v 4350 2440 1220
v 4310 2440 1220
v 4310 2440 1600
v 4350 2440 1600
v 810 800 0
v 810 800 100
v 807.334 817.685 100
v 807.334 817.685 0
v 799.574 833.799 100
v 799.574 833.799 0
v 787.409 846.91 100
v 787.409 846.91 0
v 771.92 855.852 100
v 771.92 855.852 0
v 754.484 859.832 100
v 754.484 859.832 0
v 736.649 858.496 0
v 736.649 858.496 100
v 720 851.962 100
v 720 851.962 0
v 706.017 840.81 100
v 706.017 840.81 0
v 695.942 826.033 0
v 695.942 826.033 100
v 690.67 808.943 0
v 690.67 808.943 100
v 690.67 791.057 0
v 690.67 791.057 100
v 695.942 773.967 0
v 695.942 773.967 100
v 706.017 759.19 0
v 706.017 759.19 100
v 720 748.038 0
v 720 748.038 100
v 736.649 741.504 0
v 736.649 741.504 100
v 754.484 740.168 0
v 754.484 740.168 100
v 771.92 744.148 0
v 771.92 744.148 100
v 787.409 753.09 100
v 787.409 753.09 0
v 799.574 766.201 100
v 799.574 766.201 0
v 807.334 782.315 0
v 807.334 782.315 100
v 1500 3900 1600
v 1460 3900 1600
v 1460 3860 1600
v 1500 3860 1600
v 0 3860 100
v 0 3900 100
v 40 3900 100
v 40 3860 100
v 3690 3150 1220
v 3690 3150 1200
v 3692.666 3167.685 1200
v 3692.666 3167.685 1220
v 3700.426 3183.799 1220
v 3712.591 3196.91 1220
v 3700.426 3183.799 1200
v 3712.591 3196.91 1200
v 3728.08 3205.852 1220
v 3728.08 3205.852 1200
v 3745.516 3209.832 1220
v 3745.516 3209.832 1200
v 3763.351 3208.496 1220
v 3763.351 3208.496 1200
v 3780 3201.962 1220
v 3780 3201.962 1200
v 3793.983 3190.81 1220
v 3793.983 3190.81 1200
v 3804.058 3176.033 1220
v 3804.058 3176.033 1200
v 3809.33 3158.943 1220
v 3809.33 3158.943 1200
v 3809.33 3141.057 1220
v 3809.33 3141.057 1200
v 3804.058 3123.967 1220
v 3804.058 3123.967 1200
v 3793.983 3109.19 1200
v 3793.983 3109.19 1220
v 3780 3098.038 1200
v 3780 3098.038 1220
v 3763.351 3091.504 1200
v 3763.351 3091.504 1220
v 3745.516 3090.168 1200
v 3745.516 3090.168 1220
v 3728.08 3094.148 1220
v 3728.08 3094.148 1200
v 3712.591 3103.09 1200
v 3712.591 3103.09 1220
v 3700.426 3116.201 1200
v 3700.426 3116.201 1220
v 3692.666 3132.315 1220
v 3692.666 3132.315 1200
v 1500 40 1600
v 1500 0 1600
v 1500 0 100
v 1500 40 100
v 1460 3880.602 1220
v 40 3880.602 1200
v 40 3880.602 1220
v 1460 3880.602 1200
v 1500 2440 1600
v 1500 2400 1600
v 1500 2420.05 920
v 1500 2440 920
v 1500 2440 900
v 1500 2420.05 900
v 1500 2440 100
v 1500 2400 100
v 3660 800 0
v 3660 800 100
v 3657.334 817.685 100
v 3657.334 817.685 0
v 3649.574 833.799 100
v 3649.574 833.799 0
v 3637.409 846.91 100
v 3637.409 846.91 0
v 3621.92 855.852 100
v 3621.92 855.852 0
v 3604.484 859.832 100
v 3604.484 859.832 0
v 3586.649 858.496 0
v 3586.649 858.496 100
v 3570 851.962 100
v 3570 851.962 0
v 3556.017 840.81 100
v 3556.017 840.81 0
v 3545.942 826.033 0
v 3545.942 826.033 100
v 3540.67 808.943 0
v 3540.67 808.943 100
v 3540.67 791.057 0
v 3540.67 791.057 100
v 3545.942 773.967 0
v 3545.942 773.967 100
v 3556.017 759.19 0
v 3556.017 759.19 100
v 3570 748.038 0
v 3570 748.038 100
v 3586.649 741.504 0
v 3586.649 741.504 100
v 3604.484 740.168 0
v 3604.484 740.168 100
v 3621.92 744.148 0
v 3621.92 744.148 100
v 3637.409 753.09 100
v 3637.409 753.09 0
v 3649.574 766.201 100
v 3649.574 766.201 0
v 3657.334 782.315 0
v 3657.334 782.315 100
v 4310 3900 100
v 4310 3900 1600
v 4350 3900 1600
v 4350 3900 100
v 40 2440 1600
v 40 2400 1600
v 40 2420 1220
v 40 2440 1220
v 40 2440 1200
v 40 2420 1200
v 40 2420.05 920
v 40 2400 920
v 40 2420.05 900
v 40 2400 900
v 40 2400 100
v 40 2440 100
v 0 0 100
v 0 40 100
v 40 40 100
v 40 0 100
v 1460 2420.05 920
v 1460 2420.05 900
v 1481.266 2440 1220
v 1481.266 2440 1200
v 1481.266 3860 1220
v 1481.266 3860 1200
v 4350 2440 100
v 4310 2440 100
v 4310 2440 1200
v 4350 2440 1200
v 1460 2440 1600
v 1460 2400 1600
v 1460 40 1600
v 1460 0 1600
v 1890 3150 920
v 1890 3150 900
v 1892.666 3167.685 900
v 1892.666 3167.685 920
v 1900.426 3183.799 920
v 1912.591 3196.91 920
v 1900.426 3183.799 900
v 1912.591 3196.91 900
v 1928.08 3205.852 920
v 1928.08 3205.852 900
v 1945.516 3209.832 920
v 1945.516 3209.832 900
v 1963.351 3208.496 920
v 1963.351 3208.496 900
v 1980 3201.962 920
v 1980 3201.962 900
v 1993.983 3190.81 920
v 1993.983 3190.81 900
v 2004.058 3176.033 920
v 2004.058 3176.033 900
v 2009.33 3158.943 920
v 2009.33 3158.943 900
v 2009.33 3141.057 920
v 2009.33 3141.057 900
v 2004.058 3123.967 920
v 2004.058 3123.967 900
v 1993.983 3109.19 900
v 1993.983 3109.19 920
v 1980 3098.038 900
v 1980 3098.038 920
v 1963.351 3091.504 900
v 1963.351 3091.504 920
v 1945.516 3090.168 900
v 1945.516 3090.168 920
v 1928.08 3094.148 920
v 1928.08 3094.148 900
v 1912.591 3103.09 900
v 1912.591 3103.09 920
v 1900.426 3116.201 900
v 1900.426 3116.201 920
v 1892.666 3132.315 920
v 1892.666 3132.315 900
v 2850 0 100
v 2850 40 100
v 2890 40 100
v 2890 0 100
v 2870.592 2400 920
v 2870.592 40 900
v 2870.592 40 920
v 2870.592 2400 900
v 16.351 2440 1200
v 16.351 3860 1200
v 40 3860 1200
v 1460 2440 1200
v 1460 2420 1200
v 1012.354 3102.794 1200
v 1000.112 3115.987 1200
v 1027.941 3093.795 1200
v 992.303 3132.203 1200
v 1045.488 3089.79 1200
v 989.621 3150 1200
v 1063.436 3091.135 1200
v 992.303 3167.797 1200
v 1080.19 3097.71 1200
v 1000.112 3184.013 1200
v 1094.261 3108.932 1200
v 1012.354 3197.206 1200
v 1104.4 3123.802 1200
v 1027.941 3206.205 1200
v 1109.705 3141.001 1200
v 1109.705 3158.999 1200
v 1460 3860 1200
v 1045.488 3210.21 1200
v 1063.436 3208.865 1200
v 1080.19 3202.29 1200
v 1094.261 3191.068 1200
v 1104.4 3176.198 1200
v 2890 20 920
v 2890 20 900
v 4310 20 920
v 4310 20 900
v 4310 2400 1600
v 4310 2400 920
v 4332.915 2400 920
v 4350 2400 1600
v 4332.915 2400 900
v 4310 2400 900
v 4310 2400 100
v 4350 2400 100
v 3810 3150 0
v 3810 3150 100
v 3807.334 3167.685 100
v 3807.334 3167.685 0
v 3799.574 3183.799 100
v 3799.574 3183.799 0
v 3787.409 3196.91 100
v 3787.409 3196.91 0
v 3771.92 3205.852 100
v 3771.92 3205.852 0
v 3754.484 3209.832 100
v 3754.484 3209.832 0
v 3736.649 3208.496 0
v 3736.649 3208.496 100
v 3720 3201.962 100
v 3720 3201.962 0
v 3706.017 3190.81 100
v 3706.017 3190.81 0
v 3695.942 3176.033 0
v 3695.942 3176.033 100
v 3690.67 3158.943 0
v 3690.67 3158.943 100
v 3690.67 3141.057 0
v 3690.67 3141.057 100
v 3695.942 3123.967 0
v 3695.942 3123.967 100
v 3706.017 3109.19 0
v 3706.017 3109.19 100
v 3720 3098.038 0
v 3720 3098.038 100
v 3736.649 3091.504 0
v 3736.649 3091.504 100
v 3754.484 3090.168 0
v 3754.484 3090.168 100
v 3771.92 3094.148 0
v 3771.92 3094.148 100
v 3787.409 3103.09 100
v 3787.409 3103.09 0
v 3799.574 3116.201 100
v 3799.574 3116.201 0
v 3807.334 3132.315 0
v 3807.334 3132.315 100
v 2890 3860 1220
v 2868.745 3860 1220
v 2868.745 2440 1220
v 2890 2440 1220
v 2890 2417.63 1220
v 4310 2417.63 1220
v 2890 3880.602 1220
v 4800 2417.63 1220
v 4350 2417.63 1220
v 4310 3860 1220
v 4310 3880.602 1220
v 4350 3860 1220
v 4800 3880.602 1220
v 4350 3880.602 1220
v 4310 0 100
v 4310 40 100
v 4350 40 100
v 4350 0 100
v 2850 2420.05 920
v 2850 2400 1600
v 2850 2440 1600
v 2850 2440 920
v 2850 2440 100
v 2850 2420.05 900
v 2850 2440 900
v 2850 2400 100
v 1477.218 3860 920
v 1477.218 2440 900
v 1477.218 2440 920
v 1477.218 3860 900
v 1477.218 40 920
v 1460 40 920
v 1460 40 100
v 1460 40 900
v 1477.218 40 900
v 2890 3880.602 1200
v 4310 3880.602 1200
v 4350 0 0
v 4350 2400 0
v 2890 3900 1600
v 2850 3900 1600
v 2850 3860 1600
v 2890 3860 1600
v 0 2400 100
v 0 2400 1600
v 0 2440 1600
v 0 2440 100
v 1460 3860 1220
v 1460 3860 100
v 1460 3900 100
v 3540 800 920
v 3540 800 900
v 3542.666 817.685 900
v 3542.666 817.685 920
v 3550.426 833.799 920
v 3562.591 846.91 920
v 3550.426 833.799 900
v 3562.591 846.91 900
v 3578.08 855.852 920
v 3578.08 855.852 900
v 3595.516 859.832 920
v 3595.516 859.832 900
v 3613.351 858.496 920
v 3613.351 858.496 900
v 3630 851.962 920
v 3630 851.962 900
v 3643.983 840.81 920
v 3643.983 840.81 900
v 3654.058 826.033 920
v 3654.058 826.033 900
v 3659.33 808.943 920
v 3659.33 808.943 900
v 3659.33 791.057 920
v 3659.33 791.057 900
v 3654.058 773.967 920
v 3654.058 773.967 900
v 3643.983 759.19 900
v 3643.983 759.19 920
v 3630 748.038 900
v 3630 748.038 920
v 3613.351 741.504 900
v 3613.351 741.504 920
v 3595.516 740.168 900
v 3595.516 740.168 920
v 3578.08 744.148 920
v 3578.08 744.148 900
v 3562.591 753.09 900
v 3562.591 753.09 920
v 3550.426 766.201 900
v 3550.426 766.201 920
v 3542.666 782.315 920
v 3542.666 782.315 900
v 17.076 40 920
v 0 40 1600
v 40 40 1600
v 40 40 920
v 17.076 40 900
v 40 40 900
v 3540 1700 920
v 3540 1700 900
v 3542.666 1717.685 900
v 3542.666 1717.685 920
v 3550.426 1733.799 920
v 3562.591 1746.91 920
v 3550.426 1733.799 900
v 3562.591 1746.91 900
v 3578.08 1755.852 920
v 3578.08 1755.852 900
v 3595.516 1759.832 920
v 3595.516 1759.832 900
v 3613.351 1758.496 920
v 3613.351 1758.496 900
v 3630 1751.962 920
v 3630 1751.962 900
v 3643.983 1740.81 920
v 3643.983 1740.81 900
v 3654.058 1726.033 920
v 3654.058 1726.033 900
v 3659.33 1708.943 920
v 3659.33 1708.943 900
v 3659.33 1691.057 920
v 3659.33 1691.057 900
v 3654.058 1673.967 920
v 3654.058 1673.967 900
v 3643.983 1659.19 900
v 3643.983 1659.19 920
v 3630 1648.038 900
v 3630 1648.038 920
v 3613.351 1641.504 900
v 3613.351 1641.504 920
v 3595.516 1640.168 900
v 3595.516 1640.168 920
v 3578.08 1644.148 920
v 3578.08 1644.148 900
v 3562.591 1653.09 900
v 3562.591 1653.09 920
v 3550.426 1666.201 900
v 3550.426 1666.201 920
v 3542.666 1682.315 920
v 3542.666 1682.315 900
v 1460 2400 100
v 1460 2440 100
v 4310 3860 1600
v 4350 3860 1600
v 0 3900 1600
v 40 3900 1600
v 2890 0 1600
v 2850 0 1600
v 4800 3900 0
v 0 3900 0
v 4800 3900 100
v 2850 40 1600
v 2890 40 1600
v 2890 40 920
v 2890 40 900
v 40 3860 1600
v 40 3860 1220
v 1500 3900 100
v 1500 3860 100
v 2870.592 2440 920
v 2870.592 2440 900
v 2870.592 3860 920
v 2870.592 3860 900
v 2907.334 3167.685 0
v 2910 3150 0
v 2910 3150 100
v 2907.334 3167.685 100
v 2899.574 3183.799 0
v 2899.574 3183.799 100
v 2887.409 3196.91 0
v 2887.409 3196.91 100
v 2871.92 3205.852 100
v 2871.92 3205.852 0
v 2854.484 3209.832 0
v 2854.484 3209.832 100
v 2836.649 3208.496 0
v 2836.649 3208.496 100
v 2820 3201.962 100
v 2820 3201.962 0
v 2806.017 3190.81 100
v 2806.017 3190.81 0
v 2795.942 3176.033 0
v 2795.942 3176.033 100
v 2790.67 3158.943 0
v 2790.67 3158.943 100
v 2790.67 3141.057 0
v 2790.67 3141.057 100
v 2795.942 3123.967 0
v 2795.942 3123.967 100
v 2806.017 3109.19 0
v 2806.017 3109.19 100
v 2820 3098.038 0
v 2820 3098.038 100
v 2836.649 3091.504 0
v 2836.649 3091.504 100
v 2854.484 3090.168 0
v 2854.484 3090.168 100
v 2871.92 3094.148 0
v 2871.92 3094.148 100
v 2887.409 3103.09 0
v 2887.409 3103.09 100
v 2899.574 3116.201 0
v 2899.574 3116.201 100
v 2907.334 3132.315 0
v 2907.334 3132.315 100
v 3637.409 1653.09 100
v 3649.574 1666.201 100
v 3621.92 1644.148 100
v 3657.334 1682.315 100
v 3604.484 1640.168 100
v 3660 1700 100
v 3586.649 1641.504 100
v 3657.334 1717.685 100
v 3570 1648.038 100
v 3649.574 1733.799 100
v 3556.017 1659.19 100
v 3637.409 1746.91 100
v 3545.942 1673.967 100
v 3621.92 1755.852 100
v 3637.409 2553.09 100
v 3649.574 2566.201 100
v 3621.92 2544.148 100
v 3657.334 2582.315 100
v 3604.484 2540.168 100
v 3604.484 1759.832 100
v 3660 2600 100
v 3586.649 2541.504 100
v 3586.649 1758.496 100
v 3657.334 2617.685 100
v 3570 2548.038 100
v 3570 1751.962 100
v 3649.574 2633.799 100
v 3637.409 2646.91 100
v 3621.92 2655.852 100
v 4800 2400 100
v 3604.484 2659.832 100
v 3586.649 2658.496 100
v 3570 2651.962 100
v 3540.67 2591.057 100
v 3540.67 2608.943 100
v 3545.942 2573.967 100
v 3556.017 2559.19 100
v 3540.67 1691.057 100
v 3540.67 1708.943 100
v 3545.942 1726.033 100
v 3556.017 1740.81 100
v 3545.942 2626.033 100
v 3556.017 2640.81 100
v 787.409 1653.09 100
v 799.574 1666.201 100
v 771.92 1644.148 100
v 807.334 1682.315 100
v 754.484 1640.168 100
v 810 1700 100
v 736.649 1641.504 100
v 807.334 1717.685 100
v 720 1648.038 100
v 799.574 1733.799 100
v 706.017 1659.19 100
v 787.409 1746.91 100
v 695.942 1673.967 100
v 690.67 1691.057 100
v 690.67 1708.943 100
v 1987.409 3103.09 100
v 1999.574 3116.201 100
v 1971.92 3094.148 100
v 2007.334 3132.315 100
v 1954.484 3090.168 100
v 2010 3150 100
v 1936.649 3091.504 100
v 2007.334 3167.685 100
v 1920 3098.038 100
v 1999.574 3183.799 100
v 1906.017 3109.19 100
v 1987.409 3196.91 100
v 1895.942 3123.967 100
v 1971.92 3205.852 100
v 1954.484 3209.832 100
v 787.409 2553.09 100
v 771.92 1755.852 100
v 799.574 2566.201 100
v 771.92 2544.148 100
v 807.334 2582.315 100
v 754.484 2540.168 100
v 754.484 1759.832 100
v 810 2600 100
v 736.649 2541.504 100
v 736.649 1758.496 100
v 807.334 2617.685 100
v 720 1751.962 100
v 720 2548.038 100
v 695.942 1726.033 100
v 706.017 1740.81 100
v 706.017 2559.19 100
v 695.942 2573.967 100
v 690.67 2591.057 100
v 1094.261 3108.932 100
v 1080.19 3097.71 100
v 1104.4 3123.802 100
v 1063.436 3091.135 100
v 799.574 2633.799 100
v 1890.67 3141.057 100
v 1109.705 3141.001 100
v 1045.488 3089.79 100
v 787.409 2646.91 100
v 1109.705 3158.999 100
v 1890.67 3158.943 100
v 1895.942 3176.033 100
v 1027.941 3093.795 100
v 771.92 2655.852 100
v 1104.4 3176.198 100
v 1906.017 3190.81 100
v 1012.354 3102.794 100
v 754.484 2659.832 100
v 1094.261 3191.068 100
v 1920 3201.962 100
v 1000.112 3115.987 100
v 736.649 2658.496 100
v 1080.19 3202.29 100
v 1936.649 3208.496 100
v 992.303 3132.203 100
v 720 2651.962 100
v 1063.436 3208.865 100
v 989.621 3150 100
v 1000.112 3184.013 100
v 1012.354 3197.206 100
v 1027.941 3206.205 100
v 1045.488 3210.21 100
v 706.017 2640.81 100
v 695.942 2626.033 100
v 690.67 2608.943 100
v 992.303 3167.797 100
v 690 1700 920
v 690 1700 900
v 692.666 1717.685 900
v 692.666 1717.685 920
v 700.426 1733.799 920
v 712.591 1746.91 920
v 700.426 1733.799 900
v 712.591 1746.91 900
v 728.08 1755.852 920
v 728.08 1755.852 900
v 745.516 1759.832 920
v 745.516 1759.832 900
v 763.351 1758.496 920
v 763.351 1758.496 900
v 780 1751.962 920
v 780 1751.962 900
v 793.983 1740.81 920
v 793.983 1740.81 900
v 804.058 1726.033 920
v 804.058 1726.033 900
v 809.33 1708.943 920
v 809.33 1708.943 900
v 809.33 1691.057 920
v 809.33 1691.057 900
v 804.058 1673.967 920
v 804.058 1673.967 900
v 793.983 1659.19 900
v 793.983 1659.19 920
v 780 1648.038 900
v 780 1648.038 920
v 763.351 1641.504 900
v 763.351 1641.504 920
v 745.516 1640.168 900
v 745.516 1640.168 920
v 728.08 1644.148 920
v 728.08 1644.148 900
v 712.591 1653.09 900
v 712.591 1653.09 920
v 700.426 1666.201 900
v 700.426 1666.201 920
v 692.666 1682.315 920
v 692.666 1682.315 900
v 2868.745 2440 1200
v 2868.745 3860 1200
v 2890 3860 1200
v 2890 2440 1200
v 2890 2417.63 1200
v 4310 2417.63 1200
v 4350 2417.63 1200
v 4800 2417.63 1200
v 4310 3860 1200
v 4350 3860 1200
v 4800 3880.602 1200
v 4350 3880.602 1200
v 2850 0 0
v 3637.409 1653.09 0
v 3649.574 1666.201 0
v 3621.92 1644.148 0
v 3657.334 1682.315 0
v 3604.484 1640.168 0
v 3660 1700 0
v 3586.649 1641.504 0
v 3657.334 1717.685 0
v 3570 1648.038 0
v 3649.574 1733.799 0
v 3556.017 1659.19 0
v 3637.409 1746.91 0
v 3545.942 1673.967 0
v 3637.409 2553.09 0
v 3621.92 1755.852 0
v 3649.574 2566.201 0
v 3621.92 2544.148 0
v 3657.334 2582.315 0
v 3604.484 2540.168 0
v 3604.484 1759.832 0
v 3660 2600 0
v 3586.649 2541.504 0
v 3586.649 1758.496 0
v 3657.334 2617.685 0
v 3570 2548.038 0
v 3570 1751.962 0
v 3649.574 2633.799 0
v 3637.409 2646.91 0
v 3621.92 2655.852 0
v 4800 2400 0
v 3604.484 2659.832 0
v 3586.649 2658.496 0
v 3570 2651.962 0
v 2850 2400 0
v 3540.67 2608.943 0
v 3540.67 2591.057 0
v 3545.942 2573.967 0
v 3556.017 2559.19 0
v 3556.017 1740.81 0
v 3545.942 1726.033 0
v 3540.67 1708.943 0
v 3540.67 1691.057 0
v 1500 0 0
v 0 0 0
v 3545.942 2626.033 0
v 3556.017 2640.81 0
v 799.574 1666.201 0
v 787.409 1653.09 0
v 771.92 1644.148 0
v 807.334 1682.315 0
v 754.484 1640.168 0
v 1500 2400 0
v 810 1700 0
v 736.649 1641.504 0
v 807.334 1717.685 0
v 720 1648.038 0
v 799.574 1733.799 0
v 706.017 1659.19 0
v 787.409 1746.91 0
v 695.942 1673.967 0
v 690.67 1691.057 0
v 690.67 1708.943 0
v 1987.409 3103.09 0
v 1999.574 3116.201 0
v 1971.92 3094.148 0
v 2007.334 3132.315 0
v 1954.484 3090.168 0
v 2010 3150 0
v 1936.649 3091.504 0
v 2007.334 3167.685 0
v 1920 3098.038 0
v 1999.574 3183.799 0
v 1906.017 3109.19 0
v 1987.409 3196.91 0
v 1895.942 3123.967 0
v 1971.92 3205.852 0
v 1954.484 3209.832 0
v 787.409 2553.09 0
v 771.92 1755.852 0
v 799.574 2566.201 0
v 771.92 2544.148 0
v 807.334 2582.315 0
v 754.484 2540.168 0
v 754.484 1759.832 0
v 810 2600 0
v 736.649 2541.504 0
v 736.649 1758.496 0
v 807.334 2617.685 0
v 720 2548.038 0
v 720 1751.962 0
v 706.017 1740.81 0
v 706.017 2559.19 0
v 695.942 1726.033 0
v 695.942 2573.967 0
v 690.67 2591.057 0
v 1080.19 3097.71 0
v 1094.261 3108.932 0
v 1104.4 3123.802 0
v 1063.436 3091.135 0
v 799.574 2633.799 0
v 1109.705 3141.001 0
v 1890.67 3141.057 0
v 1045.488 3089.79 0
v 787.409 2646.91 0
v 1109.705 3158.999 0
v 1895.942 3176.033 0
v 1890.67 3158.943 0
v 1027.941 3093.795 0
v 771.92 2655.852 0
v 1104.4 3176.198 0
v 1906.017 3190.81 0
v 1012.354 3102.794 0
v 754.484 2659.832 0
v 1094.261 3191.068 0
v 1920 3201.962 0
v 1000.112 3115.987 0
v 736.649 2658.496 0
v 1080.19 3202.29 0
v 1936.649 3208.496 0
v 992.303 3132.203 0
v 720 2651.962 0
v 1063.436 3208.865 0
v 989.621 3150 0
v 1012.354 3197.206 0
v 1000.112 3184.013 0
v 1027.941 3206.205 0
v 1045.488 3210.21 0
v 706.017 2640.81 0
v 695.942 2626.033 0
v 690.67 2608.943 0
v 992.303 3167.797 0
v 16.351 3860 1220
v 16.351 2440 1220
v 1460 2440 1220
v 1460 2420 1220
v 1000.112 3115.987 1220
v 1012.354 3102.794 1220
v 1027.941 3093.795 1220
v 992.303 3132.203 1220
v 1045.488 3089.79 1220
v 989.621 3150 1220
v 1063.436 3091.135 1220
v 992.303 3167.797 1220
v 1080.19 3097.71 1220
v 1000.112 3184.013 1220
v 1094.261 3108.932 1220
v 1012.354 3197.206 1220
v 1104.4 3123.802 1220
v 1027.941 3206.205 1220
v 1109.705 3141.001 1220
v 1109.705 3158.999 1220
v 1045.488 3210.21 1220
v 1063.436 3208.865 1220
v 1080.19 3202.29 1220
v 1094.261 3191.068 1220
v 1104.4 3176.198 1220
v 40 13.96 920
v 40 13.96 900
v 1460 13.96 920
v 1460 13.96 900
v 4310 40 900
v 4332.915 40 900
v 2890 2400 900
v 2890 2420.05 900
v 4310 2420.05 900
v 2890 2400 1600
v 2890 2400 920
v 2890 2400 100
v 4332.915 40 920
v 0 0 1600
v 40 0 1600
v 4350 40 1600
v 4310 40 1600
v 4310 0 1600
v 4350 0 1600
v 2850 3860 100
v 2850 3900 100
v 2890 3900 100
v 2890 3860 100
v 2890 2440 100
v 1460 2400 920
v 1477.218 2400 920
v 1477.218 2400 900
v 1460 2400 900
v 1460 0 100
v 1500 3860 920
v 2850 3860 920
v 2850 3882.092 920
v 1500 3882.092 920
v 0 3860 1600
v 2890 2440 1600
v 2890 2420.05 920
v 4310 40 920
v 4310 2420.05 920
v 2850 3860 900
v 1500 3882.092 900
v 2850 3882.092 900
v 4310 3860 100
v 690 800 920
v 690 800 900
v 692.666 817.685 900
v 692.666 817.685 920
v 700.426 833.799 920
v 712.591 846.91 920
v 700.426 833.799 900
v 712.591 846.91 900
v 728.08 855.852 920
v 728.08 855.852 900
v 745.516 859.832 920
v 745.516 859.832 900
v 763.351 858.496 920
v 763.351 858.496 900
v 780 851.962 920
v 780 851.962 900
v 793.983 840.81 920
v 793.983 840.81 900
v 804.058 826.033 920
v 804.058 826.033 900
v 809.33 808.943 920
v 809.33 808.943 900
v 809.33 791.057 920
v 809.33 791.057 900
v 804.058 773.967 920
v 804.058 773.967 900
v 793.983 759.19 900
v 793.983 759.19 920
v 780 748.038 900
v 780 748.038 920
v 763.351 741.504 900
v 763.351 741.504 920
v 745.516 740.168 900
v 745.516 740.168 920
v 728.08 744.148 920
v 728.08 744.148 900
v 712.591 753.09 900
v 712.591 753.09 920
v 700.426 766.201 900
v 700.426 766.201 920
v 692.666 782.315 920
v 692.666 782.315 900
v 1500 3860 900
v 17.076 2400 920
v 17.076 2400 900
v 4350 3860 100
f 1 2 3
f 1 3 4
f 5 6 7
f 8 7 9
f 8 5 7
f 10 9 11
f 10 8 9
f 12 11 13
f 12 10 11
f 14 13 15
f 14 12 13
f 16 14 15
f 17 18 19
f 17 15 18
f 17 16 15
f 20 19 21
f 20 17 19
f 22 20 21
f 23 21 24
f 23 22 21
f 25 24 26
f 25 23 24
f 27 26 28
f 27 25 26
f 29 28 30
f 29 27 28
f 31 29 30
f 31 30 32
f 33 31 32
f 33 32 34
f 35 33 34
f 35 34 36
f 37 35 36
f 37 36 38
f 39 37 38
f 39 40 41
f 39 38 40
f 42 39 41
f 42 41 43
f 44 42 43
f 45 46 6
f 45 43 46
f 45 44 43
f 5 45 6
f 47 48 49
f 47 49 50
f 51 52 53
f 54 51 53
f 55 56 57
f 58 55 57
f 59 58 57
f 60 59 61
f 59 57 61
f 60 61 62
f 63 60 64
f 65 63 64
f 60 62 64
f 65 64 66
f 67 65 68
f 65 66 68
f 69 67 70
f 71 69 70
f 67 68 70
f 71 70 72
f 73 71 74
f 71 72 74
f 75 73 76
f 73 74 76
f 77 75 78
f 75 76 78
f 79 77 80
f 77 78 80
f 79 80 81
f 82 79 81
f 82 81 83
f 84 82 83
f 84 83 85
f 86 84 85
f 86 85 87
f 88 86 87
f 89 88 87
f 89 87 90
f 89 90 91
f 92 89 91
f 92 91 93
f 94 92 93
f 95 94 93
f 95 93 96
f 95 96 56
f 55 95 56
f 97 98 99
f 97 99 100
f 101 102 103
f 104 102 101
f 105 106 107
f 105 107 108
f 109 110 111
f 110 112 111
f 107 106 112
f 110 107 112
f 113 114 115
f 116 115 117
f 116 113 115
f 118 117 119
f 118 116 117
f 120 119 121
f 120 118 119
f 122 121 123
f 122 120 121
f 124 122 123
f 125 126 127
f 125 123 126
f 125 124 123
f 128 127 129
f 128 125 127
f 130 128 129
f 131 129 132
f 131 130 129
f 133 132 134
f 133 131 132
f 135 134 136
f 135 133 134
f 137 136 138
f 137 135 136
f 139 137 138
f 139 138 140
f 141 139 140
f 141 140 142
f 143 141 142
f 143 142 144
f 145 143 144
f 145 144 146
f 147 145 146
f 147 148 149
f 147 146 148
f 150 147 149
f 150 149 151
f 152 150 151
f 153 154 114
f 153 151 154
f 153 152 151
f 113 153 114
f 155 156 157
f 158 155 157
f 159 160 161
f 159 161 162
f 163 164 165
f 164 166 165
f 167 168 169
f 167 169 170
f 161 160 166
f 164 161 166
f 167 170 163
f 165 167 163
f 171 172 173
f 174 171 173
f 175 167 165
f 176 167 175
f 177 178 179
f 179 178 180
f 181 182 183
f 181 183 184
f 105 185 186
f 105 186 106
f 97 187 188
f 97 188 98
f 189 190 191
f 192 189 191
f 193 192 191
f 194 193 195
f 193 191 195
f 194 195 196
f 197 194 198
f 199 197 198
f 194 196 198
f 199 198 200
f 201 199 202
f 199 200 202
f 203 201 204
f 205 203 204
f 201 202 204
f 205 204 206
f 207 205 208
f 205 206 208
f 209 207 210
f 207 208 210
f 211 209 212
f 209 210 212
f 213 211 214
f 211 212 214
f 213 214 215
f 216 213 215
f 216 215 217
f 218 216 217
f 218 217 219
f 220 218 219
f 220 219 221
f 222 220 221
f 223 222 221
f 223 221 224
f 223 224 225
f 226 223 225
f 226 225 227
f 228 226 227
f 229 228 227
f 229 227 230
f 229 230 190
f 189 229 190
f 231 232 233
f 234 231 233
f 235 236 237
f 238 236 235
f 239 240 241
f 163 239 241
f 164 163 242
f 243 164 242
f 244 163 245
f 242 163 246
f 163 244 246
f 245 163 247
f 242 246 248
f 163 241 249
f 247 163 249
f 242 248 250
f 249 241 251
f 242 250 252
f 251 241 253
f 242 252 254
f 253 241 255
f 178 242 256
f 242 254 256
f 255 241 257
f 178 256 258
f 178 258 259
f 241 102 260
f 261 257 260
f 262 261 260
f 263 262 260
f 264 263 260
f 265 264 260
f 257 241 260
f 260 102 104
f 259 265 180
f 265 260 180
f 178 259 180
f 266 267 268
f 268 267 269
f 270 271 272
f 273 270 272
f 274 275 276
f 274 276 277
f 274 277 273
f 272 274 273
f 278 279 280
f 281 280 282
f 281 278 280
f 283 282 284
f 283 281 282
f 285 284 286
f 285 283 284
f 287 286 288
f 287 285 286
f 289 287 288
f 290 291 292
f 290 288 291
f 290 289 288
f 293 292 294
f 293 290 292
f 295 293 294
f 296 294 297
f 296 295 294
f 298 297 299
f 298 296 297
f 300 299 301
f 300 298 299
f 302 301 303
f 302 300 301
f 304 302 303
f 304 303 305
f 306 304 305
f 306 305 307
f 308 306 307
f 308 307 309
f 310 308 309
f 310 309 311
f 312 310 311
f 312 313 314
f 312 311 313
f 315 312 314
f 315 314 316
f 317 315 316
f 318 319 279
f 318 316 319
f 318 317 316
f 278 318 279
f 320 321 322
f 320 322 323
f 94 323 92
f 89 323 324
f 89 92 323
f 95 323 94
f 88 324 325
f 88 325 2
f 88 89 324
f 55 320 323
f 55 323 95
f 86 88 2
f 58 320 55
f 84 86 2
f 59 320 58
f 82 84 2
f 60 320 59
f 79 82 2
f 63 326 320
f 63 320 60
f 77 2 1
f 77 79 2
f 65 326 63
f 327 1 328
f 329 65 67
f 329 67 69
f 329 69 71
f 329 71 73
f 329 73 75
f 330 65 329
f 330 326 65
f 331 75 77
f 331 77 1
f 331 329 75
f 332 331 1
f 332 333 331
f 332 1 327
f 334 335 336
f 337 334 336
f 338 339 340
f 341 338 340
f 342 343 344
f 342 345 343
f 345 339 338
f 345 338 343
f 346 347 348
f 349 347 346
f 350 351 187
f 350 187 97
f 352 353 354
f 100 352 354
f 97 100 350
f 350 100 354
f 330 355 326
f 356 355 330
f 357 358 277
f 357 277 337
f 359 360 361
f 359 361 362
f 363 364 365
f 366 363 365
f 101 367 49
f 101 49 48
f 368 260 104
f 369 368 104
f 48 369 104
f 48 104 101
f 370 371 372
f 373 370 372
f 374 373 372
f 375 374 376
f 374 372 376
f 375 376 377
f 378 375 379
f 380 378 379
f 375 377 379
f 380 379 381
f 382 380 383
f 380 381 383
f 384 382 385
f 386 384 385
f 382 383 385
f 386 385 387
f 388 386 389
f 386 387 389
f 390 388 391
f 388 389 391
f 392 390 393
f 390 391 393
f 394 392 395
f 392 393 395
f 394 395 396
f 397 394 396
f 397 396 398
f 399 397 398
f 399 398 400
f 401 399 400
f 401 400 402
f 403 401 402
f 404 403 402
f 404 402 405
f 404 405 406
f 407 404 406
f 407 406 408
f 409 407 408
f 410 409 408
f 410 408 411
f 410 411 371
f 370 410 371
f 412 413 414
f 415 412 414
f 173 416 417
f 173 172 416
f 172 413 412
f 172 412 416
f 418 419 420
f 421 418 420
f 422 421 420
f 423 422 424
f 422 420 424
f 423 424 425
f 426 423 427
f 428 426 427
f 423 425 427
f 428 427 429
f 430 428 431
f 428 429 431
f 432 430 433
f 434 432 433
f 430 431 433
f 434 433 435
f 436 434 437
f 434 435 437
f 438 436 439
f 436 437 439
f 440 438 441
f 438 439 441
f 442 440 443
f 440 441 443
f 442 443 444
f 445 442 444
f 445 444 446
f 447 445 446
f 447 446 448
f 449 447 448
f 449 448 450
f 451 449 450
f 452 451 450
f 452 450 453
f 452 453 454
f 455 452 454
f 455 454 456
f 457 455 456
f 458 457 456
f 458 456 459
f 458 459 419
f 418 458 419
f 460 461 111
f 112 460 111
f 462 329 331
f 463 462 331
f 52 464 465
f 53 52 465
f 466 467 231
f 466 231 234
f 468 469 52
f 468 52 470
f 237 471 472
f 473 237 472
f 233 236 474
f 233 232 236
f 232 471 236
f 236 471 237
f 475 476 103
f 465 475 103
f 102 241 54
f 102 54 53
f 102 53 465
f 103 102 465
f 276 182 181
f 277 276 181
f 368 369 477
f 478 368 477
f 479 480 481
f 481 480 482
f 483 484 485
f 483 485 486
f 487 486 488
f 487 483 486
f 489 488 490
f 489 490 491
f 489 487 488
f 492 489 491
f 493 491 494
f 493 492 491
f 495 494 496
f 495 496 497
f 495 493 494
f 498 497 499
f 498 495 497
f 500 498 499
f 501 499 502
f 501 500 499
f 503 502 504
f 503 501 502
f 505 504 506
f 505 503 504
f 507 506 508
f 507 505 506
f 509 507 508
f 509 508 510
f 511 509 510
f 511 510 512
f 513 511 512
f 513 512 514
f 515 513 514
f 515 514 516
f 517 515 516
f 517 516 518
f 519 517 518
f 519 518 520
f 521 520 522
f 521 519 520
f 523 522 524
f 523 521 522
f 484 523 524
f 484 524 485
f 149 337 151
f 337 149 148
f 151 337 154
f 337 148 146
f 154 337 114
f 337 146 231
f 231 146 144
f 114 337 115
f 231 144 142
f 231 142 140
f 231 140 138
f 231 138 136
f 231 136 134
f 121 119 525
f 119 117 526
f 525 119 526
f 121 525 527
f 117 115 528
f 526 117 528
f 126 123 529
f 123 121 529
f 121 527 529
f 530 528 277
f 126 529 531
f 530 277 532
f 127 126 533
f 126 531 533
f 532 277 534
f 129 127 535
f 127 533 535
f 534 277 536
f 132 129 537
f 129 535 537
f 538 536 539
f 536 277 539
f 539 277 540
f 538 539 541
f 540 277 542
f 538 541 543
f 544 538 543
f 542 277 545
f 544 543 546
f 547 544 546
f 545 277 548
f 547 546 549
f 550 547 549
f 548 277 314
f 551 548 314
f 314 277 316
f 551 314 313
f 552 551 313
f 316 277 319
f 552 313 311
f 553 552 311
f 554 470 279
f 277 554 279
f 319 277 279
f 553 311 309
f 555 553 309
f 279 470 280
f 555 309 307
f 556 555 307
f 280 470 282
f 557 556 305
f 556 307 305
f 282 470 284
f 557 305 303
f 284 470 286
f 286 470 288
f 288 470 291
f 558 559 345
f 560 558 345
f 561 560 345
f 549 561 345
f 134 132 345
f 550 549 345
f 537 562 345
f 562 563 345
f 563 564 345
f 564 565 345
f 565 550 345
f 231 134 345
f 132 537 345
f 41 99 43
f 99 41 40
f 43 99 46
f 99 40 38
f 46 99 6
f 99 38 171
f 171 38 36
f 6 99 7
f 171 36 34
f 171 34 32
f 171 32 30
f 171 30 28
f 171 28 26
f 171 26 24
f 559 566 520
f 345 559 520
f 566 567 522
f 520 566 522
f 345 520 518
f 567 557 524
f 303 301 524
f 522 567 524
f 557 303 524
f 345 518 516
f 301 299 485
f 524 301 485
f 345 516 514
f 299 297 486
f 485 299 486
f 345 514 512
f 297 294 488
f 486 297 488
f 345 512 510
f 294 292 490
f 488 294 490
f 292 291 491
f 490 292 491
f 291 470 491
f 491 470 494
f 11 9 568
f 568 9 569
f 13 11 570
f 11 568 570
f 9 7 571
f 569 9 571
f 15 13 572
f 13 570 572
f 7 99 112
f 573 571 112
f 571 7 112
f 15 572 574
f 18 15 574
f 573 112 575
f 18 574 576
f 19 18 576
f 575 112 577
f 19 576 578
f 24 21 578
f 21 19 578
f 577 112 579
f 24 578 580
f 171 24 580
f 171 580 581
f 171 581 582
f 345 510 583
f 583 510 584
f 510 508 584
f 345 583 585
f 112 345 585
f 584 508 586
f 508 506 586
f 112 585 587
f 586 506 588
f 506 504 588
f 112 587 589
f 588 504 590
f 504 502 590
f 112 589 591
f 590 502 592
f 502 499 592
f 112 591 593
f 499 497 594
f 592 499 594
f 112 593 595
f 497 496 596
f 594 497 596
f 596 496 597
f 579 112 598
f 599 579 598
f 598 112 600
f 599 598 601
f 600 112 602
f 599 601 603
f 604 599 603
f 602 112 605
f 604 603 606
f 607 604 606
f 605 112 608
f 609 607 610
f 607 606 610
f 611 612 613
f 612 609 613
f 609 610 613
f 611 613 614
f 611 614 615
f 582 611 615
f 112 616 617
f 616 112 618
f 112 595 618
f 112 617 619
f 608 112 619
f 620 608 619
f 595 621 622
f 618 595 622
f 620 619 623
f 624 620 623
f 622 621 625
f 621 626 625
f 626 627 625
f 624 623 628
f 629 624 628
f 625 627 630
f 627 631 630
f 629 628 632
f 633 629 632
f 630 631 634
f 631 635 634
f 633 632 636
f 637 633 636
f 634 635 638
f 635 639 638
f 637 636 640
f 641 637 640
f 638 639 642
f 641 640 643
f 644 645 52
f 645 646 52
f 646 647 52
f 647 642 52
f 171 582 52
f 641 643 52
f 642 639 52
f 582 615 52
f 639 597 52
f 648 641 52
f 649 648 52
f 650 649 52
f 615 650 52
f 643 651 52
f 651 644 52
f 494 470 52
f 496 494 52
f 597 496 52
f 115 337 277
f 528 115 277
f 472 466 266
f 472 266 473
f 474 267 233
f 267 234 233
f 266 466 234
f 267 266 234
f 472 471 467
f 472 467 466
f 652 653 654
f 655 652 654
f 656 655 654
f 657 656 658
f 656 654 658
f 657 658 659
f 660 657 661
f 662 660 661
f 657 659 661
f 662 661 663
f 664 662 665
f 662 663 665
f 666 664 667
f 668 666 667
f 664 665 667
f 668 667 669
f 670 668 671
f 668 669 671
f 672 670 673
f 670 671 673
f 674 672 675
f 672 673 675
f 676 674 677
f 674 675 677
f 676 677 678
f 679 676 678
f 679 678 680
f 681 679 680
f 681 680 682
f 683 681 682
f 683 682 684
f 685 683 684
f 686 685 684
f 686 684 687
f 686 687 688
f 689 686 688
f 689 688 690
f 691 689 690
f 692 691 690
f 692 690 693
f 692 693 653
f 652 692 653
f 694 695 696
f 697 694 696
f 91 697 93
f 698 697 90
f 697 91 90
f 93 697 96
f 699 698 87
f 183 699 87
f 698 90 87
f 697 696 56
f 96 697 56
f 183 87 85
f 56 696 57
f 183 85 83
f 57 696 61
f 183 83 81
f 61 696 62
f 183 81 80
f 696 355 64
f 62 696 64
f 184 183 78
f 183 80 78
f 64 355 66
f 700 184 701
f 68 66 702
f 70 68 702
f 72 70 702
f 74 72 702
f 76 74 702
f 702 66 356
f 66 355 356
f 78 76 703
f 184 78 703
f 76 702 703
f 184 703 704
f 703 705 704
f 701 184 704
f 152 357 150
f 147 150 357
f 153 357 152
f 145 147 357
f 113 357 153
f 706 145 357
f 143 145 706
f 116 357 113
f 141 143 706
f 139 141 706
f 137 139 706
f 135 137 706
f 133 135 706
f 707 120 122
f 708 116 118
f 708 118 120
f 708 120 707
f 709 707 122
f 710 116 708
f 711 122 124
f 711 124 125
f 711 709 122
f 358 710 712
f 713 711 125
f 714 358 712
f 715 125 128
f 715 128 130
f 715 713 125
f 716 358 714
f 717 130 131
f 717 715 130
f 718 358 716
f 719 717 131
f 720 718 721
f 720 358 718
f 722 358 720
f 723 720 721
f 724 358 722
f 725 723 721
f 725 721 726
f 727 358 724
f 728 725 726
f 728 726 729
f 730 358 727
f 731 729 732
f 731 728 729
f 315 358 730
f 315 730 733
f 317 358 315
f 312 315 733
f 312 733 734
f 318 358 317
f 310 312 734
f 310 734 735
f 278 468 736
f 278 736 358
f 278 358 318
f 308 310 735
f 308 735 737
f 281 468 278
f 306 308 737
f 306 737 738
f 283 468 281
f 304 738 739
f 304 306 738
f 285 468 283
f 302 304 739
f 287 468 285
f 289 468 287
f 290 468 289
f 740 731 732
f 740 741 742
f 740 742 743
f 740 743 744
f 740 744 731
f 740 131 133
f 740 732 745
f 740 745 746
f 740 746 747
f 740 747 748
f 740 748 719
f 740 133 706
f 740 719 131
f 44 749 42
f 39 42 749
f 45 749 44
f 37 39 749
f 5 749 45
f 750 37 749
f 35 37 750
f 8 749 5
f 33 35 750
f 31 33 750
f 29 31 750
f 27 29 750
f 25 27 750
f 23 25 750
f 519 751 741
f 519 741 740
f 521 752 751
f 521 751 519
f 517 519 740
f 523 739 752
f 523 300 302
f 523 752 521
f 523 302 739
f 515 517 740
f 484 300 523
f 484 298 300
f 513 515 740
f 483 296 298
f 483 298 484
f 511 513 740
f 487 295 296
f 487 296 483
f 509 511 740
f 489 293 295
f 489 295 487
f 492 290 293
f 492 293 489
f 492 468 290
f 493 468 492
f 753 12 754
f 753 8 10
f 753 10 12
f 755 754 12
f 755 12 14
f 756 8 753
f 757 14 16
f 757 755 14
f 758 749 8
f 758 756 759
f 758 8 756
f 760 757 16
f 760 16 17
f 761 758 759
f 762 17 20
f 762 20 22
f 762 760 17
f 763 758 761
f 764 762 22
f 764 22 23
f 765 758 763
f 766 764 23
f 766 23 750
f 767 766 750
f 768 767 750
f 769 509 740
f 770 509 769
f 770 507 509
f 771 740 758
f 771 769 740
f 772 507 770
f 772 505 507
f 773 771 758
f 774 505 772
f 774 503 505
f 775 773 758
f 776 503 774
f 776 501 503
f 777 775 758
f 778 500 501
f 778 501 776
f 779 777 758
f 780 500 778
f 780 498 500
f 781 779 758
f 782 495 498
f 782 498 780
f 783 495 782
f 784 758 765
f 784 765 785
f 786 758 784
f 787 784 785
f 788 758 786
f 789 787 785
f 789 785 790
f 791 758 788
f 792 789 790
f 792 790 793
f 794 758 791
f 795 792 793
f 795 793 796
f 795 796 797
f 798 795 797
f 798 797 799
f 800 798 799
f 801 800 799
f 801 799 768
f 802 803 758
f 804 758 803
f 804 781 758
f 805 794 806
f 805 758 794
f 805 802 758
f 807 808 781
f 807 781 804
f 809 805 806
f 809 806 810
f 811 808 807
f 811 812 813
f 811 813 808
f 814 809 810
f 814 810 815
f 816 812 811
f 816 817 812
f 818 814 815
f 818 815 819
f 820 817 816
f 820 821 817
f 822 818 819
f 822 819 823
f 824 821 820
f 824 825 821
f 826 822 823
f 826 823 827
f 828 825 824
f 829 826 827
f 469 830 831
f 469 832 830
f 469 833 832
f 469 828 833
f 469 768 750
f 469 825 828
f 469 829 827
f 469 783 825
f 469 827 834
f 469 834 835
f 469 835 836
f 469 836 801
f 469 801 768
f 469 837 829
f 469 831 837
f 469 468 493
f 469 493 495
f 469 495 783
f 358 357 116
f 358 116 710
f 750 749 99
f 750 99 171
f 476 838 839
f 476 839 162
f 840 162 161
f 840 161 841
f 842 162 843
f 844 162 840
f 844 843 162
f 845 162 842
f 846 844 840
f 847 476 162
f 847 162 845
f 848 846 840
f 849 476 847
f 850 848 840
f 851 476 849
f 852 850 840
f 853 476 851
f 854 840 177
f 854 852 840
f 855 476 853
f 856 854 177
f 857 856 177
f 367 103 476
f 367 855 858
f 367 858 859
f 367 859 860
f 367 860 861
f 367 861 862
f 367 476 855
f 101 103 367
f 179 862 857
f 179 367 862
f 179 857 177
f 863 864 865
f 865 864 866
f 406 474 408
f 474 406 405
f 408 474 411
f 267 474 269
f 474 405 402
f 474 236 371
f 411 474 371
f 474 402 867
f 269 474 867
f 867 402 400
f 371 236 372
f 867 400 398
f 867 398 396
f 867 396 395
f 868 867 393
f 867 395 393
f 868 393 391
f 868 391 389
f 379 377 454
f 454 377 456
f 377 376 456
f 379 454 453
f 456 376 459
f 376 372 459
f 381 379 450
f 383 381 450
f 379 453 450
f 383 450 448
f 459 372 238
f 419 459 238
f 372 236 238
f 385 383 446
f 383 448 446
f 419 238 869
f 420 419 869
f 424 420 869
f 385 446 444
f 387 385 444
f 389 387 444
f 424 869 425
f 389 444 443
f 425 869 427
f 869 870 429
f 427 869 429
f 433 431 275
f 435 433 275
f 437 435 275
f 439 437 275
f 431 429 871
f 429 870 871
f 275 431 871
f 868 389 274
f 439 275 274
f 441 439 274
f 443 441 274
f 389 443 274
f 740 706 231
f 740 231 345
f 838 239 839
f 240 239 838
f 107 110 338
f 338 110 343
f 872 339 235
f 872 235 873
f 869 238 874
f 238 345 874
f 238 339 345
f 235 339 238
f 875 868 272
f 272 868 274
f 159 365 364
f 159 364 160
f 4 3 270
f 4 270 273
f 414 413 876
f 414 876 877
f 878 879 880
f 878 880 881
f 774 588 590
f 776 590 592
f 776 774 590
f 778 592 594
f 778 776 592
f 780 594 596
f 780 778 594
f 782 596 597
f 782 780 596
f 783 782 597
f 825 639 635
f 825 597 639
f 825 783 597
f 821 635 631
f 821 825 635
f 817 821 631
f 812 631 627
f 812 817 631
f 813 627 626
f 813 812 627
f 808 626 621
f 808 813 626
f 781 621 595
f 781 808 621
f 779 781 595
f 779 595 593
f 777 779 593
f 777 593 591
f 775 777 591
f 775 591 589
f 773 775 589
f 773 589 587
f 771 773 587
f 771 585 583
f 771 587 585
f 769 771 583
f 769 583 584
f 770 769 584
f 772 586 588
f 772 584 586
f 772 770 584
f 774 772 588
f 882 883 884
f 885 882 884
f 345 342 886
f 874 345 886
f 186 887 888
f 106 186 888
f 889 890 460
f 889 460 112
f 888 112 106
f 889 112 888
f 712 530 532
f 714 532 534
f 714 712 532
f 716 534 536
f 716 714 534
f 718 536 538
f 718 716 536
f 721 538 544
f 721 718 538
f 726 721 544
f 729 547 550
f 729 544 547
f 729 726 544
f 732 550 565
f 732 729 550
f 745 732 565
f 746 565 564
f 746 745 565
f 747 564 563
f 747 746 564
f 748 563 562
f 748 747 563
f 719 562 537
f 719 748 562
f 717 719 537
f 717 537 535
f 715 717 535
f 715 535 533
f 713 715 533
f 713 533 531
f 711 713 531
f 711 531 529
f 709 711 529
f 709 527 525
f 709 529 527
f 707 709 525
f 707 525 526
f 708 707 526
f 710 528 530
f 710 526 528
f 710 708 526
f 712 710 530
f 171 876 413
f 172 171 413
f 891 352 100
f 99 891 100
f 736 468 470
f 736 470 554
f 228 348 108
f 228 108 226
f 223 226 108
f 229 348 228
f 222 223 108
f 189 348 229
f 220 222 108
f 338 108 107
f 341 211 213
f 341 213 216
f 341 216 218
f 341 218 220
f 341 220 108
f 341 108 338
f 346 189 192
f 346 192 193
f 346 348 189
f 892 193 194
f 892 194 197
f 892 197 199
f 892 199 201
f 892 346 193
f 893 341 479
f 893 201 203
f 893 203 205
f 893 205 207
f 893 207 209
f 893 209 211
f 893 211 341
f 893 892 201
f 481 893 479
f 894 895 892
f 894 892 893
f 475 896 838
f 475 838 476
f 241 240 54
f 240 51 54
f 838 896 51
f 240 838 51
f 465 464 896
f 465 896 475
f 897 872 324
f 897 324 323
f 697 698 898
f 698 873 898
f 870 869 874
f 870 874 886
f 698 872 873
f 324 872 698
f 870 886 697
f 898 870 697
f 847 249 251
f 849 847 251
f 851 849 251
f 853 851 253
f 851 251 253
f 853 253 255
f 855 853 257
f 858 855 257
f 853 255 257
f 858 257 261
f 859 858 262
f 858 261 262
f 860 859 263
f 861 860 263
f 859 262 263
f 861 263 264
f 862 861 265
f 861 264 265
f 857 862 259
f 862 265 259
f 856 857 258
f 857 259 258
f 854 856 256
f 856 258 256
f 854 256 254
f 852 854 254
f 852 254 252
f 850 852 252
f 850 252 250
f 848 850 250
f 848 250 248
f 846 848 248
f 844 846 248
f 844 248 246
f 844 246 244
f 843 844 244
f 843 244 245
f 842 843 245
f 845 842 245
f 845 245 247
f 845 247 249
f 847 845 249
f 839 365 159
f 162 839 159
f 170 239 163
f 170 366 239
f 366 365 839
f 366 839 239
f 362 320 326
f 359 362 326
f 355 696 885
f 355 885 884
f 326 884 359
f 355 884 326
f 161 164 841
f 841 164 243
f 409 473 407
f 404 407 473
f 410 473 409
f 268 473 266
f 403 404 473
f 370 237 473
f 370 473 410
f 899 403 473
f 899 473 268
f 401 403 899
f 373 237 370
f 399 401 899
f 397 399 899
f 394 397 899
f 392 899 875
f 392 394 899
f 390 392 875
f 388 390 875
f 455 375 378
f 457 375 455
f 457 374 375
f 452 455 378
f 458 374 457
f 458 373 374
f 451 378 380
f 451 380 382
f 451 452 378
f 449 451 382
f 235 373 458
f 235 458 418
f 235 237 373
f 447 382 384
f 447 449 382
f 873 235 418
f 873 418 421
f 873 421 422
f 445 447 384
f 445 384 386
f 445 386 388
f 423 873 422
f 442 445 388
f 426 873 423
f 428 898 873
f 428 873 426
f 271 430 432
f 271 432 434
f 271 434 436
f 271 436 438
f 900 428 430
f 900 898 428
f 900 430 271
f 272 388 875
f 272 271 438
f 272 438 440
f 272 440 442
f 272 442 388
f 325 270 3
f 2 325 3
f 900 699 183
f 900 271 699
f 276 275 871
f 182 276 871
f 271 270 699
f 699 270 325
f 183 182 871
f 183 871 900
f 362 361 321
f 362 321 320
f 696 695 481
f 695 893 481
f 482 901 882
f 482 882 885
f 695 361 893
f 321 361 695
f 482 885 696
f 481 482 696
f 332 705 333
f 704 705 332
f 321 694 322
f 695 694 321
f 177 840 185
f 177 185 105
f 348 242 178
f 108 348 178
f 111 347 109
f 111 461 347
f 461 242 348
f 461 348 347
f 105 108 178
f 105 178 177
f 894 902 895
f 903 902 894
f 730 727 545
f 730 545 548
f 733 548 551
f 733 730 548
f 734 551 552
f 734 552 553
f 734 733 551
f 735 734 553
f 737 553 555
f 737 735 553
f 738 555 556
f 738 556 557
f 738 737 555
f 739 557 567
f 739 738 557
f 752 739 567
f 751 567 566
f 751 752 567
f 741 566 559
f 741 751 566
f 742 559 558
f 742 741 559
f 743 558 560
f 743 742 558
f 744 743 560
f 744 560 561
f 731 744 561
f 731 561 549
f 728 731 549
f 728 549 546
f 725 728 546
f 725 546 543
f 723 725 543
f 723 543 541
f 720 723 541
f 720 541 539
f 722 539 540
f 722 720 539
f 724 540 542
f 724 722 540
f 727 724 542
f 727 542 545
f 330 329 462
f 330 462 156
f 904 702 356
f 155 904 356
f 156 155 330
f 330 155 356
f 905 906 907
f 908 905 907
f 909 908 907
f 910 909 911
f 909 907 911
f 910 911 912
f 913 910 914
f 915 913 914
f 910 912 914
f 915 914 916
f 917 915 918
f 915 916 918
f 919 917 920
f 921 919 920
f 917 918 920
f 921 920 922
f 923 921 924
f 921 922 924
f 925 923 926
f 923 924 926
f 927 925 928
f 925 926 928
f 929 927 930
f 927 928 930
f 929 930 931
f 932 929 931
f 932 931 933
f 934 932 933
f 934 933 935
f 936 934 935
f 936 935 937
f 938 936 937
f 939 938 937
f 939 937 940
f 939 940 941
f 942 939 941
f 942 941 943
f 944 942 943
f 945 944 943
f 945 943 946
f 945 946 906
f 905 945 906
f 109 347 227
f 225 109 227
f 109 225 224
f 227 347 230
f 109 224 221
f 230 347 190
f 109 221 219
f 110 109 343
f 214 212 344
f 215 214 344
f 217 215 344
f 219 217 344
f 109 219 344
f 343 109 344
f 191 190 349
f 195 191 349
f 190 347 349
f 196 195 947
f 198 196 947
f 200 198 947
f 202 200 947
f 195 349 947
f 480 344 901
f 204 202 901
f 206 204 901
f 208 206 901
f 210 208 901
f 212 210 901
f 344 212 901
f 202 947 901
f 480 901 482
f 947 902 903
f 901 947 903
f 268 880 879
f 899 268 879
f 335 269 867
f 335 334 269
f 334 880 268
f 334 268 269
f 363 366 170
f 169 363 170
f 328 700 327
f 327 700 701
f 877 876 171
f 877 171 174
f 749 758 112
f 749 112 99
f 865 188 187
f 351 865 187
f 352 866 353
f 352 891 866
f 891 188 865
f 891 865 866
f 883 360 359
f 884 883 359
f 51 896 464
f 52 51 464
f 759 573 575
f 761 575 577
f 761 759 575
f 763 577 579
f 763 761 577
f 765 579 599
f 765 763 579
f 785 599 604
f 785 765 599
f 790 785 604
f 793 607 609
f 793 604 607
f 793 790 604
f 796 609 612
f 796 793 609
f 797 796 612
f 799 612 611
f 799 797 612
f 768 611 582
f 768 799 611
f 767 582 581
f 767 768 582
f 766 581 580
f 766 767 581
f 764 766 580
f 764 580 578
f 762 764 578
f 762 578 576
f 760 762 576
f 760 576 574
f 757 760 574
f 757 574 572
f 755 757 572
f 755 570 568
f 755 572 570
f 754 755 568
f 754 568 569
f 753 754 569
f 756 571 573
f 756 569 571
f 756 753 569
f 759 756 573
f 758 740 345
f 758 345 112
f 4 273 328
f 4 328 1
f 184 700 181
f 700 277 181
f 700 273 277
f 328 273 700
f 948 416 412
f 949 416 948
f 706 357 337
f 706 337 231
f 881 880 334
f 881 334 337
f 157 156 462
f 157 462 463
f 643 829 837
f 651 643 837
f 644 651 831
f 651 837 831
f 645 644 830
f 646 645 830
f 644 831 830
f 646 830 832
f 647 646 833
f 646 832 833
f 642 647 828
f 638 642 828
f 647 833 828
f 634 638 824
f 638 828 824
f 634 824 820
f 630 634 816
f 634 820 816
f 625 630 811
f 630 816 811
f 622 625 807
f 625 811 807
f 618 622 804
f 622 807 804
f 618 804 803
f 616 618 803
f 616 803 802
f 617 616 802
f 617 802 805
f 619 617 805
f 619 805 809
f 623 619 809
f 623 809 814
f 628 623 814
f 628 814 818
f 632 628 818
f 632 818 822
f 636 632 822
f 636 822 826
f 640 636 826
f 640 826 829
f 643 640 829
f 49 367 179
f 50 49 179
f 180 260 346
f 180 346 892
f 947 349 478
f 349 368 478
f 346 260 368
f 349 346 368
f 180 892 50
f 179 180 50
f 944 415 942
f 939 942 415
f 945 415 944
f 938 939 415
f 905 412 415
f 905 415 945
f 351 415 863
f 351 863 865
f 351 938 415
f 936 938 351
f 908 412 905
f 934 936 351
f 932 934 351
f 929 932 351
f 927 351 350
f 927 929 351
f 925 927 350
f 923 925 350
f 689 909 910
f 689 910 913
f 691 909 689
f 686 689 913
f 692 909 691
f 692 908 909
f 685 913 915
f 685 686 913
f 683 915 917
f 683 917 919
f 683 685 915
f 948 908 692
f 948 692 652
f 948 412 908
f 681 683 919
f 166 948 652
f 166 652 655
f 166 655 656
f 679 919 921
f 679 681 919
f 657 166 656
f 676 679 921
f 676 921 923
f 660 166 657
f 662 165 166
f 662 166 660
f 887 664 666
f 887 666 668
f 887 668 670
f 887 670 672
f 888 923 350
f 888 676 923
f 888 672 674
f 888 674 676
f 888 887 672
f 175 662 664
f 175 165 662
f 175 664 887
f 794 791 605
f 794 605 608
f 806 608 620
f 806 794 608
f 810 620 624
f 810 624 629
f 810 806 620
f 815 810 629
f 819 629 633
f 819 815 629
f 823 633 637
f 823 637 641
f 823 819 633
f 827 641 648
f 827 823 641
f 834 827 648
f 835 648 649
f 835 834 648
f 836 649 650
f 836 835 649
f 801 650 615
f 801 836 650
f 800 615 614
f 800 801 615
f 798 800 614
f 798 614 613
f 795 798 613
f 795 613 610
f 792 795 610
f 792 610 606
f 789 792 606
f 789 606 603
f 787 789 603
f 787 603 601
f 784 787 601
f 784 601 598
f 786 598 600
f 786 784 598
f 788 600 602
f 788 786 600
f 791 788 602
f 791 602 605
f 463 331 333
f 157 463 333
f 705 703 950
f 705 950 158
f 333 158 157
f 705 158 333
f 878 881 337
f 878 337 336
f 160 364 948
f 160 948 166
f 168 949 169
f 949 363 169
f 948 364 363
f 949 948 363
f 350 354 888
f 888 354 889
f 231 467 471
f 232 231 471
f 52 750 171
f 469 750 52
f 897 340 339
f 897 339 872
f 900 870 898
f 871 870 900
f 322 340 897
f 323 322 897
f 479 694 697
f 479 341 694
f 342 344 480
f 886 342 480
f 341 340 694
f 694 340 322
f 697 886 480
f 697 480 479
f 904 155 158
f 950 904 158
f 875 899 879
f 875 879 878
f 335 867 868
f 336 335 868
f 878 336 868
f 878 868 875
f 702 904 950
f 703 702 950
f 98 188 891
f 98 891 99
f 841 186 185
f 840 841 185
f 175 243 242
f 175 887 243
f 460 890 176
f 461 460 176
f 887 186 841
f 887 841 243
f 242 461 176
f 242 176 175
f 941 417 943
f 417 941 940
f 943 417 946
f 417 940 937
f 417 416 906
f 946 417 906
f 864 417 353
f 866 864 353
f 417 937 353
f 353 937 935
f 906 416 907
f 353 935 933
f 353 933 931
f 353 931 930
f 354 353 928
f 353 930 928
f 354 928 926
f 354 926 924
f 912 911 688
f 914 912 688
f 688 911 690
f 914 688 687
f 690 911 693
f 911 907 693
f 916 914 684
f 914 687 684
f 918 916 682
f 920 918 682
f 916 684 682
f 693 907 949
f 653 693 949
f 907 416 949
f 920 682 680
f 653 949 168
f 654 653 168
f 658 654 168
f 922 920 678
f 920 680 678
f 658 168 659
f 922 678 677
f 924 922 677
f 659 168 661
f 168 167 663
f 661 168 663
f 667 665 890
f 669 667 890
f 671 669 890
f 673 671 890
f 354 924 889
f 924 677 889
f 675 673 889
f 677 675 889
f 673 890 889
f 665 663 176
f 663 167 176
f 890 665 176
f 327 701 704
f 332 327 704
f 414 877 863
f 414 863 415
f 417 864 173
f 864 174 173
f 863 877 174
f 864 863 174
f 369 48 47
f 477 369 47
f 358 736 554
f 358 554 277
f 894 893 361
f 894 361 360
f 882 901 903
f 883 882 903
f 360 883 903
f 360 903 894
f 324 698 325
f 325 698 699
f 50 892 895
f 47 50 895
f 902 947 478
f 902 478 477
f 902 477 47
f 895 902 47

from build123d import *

# Parameters (mm, degrees)
SKETCH1_R              = 60
BOSS_EXTRUDE1_DEPTH    = 100
SKETCH2_W              = 40
SKETCH2_H              = 40
BOSS_EXTRUDE2_DEPTH    = 1500
BOSS_EXTRUDE2_2_DEPTH  = 1500
BOSS_EXTRUDE2_3_DEPTH  = 1500
BOSS_EXTRUDE2_4_DEPTH  = 1500
BOSS_EXTRUDE2_5_DEPTH  = 1500
BOSS_EXTRUDE2_6_DEPTH  = 1500
BOSS_EXTRUDE2_7_DEPTH  = 1500
BOSS_EXTRUDE2_8_DEPTH  = 1500
BOSS_EXTRUDE2_9_DEPTH  = 1500
BOSS_EXTRUDE2_10_DEPTH = 1500
BOSS_EXTRUDE2_11_DEPTH = 1500
BOSS_EXTRUDE2_12_DEPTH = 1500
SKETCH5_W              = 1464.914680954
SKETCH5_H              = 1460.602204205
SKETCH5_W_2            = 1931.254962966
SKETCH5_H_2            = 1462.971886732
BOSS_EXTRUDE5_DEPTH    = 20
SKETCH3_W              = 1460.142152684
SKETCH3_H              = 2406.089345402
SKETCH3_W_2            = 1393.373517389
SKETCH3_H_2            = 1462.042486102
SKETCH3_W_3            = 1462.322698413
SKETCH3_H_3            = 2400.049528254
BOSS_EXTRUDE6_DEPTH    = 20
SKETCH6_R              = 60
SKETCH6_R_2            = 60.379118357
CUT_EXTRUDE2_DEPTH     = 1601


with BuildPart() as part:
    # Sketch1 → Boss-Extrude1 (new body)
    with BuildSketch(Plane.XY):
        Polygon((0, 0), (0, 3900), (4800, 3900), (4800, 2400), (4350, 2400), (4350, 0), (2850, 0), (2850, 2400), (1500, 2400), (1500, 0), align=None)
        with Locations((1050, 3150)):
            Circle(SKETCH1_R, mode=Mode.SUBTRACT)
        with Locations((1950, 3150)):
            Circle(SKETCH1_R, mode=Mode.SUBTRACT)
        with Locations((2850, 3150)):
            Circle(SKETCH1_R, mode=Mode.SUBTRACT)
        with Locations((750, 800)):
            Circle(SKETCH1_R, mode=Mode.SUBTRACT)
        with Locations((3600, 800)):
            Circle(SKETCH1_R, mode=Mode.SUBTRACT)
        with Locations((3600, 1700)):
            Circle(SKETCH1_R, mode=Mode.SUBTRACT)
        with Locations((750, 1700)):
            Circle(SKETCH1_R, mode=Mode.SUBTRACT)
        with Locations((3750, 3150)):
            Circle(SKETCH1_R, mode=Mode.SUBTRACT)
        with Locations((750, 2600)):
            Circle(SKETCH1_R, mode=Mode.SUBTRACT)
        with Locations((3600, 2600)):
            Circle(SKETCH1_R, mode=Mode.SUBTRACT)
    extrude(amount=BOSS_EXTRUDE1_DEPTH)


with BuildPart() as body_2:
    # Sketch2 → Boss-Extrude2 (new body)
    with BuildSketch(Plane.XY.offset(100)):
        with Locations((2870, 2420)):
            Rectangle(SKETCH2_W, SKETCH2_H)
    extrude(amount=BOSS_EXTRUDE2_DEPTH)



with BuildPart() as body_3:
    # Sketch2 → Boss-Extrude2 2 (new body)
    with BuildSketch(Plane.XY.offset(100)):
        with Locations((20, 3880)):
            Rectangle(SKETCH2_W, SKETCH2_H)
    extrude(amount=BOSS_EXTRUDE2_2_DEPTH)



with BuildPart() as body_4:
    # Sketch2 → Boss-Extrude2 3 (new body)
    with BuildSketch(Plane.XY.offset(100)):
        with Locations((20, 20)):
            Rectangle(SKETCH2_W, SKETCH2_H)
    extrude(amount=BOSS_EXTRUDE2_3_DEPTH)


with BuildPart() as body_5:
    # Sketch2 → Boss-Extrude2 4 (new body)
    with BuildSketch(Plane.XY.offset(100)):
        with Locations((1480, 20)):
            Rectangle(SKETCH2_W, SKETCH2_H)
    extrude(amount=BOSS_EXTRUDE2_4_DEPTH)


with BuildPart() as body_6:
    # Sketch2 → Boss-Extrude2 5 (new body)
    with BuildSketch(Plane.XY.offset(100)):
        with Locations((1480, 2420)):
            Rectangle(SKETCH2_W, SKETCH2_H)
    extrude(amount=BOSS_EXTRUDE2_5_DEPTH)


with BuildPart() as body_7:
    # Sketch2 → Boss-Extrude2 6 (new body)
    with BuildSketch(Plane.XY.offset(100)):
        with Locations((1480, 3880)):
            Rectangle(SKETCH2_W, SKETCH2_H)
    extrude(amount=BOSS_EXTRUDE2_6_DEPTH)


with BuildPart() as body_8:
    # Sketch2 → Boss-Extrude2 7 (new body)
    with BuildSketch(Plane.XY.offset(100)):
        with Locations((4330, 20)):
            Rectangle(SKETCH2_W, SKETCH2_H)
    extrude(amount=BOSS_EXTRUDE2_7_DEPTH)


with BuildPart() as body_9:
    # Sketch2 → Boss-Extrude2 8 (new body)
    with BuildSketch(Plane.XY.offset(100)):
        with Locations((2870, 20)):
            Rectangle(SKETCH2_W, SKETCH2_H)
    extrude(amount=BOSS_EXTRUDE2_8_DEPTH)


with BuildPart() as body_10:
    # Sketch2 → Boss-Extrude2 9 (new body)
    with BuildSketch(Plane.XY.offset(100)):
        with Locations((4330, 2420)):
            Rectangle(SKETCH2_W, SKETCH2_H)
    extrude(amount=BOSS_EXTRUDE2_9_DEPTH)


with BuildPart() as body_11:
    # Sketch2 → Boss-Extrude2 10 (new body)
    with BuildSketch(Plane.XY.offset(100)):
        with Locations((4330, 3880)):
            Rectangle(SKETCH2_W, SKETCH2_H)
    extrude(amount=BOSS_EXTRUDE2_10_DEPTH)


with BuildPart() as body_12:
    # Sketch2 → Boss-Extrude2 11 (new body)
    with BuildSketch(Plane.XY.offset(100)):
        with Locations((2870, 3880)):
            Rectangle(SKETCH2_W, SKETCH2_H)
    extrude(amount=BOSS_EXTRUDE2_11_DEPTH)


with BuildPart() as body_13:
    # Sketch2 → Boss-Extrude2 12 (new body)
    with BuildSketch(Plane.XY.offset(100)):
        with Locations((20, 2420)):
            Rectangle(SKETCH2_W, SKETCH2_H)
    extrude(amount=BOSS_EXTRUDE2_12_DEPTH)


with BuildPart() as body_3_1:
    add(body_3.part)

    add(body_7.part)  # Boss-Extrude5 merges body 7

    add(body_11.part)  # Boss-Extrude5 merges body 11

    add(body_12.part)  # Boss-Extrude5 merges body 12
    # Sketch5 → Boss-Extrude5 (add)
    with BuildSketch(Plane.XY.offset(1200)):
        with Locations((748.808177736, 3150.301102103)):
            Rectangle(SKETCH5_W, SKETCH5_H)
        with Locations((3834.372518517, 3149.116260839)):
            Rectangle(SKETCH5_W_2, SKETCH5_H_2)
    extrude(amount=BOSS_EXTRUDE5_DEPTH)


with BuildPart() as body_2_1:
    add(body_2.part)

    add(body_3_1.part)  # Boss-Extrude6 merges body 3

    add(body_4.part)  # Boss-Extrude6 merges body 4

    add(body_5.part)  # Boss-Extrude6 merges body 5

    add(body_6.part)  # Boss-Extrude6 merges body 6

    add(body_8.part)  # Boss-Extrude6 merges body 8

    add(body_9.part)  # Boss-Extrude6 merges body 9

    add(body_10.part)  # Boss-Extrude6 merges body 10

    add(body_13.part)  # Boss-Extrude6 merges body 13
    # Sketch3 → Boss-Extrude6 (add)
    with BuildSketch(Plane.XY.offset(900)):
        with Locations((747.147288346, 1217.004855553)):
            Rectangle(SKETCH3_W, SKETCH3_H)
        with Locations((2173.905123383, 3151.070771305)):
            Rectangle(SKETCH3_W_2, SKETCH3_H_2)
        with Locations((3601.753231284, 1220.024764127)):
            Rectangle(SKETCH3_W_3, SKETCH3_H_3)
    extrude(amount=BOSS_EXTRUDE6_DEPTH)


with BuildPart() as cut_extrude2_tool:
    # Sketch6 → Cut-Extrude2 (new body, through all)
    with BuildSketch(Plane(origin=(0, 0, 0), x_dir=(-1, 0, 0), z_dir=(0, 0, -1))):
        with Locations((-3750, 3150)):
            Circle(SKETCH6_R)
        with Locations((-1050, 3150)):
            Circle(SKETCH6_R_2)
        with Locations((-750, 1700)):
            Circle(SKETCH6_R)
        with Locations((-750, 800)):
            Circle(SKETCH6_R)
        with Locations((-3600, 800)):
            Circle(SKETCH6_R)
        with Locations((-3600, 1700)):
            Circle(SKETCH6_R)
        with Locations((-1950, 3150)):
            Circle(SKETCH6_R)
    extrude(amount=-CUT_EXTRUDE2_DEPTH)


with BuildPart() as part_1:
    add(part.part)

    # Cut-Extrude2: cut by cut_extrude2_tool
    add(cut_extrude2_tool.part, mode=Mode.SUBTRACT)


with BuildPart() as body_2_2:
    add(body_2_1.part)

    # Cut-Extrude2: cut by cut_extrude2_tool
    add(cut_extrude2_tool.part, mode=Mode.SUBTRACT)


solid = Compound([part_1.part, body_2_2.part])
